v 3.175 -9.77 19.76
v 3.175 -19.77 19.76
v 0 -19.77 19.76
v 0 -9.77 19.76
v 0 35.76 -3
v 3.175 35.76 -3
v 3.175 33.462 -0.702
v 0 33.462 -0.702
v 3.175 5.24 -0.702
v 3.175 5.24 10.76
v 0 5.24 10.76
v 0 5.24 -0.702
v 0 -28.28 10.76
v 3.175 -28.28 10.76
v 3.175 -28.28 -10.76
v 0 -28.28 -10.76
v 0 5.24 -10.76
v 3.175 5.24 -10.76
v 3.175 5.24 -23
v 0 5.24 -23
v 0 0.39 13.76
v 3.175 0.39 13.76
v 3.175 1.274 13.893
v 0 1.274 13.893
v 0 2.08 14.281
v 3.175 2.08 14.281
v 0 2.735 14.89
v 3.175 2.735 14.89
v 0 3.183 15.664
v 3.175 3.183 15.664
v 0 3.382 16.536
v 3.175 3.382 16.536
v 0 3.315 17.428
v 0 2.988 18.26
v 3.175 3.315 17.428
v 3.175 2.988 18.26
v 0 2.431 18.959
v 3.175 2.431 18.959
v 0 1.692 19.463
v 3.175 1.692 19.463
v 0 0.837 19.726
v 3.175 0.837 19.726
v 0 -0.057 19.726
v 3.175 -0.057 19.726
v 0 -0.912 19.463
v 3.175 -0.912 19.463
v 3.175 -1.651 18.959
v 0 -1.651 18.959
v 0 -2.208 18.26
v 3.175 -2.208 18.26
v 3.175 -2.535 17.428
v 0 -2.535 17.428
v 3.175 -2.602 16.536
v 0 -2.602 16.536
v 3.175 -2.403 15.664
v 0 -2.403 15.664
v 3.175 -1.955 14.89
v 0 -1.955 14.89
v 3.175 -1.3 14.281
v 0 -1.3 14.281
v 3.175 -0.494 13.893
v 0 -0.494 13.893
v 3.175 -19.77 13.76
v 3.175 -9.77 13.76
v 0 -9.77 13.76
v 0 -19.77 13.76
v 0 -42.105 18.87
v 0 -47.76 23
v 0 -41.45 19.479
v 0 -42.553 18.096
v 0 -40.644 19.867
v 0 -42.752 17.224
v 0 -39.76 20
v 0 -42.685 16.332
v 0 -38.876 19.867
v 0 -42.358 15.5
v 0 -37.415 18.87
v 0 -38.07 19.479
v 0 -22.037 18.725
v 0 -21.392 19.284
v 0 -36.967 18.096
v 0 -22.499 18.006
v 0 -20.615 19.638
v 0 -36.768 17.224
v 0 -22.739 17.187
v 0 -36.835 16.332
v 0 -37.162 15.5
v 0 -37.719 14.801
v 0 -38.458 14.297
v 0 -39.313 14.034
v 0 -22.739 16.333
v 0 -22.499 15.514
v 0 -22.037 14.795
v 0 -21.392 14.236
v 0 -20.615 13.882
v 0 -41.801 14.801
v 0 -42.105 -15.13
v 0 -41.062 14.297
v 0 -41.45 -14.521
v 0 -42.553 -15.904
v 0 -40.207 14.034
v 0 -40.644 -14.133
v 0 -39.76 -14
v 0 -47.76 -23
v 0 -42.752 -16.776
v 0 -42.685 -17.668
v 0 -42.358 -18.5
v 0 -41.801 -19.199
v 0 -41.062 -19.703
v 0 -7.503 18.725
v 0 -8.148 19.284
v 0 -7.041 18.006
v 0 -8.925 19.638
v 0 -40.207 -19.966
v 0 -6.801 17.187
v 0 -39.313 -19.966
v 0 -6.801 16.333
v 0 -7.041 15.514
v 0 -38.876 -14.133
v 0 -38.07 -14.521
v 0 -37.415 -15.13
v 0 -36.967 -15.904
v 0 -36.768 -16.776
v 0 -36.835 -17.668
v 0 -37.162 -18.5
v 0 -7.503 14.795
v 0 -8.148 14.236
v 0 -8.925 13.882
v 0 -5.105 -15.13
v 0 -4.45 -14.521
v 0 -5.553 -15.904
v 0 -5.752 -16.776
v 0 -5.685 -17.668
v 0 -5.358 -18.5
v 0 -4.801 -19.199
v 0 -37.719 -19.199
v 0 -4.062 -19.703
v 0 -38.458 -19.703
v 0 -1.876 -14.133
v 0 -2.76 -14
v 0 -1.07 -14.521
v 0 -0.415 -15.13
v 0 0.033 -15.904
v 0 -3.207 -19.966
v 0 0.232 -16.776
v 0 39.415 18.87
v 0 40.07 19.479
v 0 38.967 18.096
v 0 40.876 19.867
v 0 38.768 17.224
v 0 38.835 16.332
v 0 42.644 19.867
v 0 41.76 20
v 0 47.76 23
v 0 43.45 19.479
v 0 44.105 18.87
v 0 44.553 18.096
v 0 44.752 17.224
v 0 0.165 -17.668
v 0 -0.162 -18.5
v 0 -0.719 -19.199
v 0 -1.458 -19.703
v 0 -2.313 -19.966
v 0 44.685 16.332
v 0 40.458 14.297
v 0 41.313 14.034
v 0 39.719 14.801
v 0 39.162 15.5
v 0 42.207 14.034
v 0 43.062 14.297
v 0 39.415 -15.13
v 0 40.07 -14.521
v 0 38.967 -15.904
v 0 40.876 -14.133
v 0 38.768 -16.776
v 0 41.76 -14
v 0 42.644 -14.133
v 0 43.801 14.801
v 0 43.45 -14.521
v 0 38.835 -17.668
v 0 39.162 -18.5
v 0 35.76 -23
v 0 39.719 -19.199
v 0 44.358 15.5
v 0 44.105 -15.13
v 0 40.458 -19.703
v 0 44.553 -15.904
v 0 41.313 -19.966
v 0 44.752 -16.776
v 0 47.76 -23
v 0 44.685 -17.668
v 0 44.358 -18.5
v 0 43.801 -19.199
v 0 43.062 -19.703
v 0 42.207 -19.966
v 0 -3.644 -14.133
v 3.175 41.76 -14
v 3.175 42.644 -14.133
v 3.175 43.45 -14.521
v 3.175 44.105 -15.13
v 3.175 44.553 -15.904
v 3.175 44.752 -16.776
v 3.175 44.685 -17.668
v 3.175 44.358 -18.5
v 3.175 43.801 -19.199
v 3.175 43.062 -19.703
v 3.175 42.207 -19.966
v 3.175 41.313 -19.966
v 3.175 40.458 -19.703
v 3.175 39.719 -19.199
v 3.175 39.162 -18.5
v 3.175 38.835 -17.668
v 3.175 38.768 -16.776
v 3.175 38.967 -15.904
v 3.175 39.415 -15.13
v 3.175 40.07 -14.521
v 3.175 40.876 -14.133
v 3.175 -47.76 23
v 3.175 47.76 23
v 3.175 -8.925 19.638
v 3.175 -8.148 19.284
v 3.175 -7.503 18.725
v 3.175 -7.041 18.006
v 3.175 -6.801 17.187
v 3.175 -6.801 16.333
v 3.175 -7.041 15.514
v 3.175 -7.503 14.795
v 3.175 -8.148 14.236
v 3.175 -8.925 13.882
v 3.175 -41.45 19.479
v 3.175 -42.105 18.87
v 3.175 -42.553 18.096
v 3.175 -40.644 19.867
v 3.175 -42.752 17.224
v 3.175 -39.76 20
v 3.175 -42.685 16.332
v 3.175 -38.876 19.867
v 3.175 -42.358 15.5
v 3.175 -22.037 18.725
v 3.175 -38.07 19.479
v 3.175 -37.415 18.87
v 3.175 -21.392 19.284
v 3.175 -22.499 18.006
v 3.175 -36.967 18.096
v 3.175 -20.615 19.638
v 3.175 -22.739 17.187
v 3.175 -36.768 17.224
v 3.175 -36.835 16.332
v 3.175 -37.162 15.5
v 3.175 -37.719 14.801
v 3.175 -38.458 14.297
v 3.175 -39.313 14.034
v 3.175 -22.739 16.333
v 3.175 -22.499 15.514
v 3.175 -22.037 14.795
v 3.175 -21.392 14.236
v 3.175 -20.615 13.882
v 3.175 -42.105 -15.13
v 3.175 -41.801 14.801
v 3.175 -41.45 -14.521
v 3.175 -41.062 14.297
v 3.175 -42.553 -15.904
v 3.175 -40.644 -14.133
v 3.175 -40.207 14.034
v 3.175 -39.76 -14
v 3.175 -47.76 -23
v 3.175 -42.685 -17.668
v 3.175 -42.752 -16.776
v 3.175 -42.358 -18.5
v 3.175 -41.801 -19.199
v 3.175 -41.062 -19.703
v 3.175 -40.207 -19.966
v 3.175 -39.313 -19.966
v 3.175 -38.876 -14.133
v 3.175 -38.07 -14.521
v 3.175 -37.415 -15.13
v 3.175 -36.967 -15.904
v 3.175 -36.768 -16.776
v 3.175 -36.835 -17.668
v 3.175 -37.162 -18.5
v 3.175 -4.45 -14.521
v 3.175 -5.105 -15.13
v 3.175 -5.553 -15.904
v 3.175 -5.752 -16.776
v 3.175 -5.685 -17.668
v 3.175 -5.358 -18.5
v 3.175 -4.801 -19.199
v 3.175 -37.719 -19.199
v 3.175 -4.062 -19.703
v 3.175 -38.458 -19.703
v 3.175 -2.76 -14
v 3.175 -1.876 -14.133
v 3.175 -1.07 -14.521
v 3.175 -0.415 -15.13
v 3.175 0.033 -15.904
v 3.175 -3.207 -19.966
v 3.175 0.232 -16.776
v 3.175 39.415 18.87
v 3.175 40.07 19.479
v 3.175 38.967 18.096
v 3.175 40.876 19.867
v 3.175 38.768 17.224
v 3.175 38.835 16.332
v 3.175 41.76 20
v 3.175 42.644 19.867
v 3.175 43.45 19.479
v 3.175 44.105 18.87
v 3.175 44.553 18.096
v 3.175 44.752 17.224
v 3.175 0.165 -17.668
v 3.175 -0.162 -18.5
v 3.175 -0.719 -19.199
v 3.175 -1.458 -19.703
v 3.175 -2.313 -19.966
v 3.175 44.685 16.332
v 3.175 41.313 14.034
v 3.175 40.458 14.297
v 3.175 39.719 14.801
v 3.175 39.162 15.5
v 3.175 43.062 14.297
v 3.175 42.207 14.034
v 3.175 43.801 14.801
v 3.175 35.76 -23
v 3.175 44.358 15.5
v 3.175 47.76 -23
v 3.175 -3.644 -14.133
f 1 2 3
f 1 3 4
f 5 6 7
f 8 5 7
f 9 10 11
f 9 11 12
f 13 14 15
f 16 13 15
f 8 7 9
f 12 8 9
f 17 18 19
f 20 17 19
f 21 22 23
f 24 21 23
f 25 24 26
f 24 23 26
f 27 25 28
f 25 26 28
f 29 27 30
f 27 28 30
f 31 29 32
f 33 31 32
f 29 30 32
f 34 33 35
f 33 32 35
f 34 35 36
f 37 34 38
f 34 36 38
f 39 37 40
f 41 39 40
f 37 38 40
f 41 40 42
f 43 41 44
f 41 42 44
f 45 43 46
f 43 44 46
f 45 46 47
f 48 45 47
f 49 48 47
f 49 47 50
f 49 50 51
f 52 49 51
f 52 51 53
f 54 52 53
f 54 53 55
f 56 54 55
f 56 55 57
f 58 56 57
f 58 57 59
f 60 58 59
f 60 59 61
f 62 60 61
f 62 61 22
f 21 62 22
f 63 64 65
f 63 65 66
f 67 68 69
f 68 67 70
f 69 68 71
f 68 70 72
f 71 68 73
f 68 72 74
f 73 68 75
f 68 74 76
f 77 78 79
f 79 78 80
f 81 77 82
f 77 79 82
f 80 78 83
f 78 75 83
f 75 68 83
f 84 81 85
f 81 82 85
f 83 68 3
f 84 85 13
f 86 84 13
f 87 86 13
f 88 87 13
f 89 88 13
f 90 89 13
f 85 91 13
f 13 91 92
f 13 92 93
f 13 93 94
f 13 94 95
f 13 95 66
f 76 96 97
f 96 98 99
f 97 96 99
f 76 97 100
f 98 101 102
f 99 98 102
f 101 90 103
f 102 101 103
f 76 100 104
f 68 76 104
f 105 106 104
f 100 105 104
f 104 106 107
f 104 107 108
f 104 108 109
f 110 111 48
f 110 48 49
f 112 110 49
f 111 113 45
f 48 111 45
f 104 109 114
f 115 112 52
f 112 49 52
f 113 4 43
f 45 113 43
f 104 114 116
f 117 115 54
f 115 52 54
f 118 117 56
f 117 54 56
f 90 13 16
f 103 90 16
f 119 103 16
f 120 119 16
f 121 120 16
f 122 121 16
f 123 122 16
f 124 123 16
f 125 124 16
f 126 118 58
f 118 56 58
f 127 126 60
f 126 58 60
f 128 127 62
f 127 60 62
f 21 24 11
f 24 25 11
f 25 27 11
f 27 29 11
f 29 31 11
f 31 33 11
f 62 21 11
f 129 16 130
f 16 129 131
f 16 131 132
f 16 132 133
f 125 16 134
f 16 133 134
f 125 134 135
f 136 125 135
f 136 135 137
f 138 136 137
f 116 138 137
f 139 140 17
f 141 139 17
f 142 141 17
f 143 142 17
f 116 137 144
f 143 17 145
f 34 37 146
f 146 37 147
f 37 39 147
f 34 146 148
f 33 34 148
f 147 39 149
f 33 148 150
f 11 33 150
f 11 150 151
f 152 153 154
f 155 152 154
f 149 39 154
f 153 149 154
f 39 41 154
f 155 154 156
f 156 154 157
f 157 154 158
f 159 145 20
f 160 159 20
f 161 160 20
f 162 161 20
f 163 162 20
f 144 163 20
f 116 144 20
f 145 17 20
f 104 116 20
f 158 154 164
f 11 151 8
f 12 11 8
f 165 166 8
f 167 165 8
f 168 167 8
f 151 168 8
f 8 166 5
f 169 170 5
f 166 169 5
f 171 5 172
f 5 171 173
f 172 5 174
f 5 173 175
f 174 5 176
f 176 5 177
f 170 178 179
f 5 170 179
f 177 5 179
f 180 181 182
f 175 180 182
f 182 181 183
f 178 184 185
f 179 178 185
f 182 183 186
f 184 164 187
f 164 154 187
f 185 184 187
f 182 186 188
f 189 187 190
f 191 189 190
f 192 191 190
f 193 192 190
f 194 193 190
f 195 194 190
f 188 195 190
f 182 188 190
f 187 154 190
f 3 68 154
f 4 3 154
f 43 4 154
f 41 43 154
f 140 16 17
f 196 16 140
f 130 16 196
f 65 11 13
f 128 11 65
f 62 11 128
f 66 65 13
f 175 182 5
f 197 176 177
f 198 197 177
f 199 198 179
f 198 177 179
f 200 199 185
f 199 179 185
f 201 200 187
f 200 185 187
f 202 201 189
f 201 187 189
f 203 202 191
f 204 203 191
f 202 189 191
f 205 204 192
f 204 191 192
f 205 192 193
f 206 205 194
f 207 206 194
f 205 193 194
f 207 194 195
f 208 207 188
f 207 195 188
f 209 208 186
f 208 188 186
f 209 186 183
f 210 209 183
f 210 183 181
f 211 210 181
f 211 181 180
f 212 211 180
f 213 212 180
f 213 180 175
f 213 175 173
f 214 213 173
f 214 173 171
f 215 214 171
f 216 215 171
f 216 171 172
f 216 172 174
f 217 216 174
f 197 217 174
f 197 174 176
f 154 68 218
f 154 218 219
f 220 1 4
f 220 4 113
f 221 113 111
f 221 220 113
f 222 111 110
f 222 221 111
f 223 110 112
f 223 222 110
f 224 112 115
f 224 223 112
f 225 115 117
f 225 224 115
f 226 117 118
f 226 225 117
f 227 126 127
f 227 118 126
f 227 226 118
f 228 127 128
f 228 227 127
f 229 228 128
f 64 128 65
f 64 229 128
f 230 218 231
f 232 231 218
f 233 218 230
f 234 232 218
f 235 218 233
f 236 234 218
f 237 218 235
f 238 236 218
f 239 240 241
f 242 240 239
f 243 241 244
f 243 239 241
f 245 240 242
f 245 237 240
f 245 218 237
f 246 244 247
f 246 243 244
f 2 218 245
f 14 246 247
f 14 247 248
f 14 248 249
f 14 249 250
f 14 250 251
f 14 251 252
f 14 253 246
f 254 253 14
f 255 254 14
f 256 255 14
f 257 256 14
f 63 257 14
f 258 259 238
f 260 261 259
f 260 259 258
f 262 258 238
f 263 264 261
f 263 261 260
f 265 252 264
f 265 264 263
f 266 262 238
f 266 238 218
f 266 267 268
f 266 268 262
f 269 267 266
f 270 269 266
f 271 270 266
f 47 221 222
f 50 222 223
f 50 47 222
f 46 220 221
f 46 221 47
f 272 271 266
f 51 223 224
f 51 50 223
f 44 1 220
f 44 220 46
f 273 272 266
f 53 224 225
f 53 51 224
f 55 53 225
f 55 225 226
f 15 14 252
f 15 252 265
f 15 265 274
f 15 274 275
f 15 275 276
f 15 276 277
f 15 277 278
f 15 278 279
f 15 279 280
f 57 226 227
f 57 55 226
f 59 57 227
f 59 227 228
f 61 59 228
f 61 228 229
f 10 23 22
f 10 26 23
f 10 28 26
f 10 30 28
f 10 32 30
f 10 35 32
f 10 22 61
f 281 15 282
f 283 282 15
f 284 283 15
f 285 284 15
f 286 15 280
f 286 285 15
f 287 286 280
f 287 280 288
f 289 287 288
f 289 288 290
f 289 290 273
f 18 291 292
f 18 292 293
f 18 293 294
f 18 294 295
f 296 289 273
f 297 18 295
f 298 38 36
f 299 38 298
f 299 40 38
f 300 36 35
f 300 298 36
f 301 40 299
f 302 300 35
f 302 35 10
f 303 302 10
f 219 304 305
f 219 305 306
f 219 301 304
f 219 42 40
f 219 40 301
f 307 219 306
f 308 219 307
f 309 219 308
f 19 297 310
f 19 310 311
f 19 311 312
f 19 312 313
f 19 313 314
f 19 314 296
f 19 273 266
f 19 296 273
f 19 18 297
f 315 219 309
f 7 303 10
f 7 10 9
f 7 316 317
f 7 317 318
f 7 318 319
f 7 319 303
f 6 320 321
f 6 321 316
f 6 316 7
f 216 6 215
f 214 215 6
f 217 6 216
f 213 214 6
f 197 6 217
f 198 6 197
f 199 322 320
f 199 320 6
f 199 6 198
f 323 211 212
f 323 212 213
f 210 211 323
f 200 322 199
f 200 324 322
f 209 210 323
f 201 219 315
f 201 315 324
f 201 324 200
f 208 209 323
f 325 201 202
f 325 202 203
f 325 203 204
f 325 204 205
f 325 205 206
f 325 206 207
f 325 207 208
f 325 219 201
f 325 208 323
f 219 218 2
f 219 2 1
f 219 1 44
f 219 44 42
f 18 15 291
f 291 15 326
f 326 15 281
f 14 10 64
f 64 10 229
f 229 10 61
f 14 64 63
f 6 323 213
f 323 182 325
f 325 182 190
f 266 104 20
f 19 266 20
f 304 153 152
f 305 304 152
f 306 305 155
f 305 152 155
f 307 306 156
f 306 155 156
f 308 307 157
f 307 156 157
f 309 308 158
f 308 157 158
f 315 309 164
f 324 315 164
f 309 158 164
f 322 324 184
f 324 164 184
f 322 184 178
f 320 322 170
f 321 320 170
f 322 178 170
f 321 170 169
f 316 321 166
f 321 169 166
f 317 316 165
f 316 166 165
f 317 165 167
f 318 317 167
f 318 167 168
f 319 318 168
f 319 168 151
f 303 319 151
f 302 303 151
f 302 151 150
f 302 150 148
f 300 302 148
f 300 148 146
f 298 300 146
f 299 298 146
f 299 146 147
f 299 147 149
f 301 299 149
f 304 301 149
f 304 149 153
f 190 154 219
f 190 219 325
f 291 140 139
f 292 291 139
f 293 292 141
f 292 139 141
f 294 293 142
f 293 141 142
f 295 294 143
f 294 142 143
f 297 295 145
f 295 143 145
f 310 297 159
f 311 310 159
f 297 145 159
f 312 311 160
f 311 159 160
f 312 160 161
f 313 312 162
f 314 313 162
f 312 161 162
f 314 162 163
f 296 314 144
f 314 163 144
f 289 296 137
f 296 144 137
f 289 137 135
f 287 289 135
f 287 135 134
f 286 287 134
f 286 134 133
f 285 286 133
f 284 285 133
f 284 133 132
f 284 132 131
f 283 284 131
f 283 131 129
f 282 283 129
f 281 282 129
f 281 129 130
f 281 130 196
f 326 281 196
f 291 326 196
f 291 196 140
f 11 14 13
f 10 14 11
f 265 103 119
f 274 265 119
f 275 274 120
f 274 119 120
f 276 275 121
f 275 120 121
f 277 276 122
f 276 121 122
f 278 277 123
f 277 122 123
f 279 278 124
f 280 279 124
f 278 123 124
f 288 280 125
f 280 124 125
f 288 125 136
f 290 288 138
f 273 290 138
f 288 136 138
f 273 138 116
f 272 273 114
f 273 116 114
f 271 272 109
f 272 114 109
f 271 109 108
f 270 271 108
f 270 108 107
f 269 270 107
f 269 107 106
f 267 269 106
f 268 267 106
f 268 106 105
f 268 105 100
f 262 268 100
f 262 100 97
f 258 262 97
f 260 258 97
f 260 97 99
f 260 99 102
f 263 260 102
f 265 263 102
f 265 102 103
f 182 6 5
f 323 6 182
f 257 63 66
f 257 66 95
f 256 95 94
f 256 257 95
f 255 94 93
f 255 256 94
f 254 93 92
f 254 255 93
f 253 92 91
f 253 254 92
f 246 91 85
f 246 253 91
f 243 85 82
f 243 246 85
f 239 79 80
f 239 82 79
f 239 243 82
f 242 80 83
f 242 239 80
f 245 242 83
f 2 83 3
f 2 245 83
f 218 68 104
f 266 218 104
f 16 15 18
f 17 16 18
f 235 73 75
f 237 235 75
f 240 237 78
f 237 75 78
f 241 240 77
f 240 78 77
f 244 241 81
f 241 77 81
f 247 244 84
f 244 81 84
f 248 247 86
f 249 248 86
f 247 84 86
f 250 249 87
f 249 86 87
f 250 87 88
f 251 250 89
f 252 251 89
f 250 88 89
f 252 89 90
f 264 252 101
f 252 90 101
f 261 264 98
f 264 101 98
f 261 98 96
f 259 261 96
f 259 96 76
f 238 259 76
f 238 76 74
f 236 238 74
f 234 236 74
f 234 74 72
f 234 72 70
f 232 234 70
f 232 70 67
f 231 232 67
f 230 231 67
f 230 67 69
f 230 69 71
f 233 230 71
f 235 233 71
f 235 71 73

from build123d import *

# Parameters (mm, degrees)
SKETCH1_W                       = 46
SKETCH1_H                       = 95.52
BOSS_EXTRUDE1_DEPTH             = 3.175
SKETCH2_W                       = 20
SKETCH2_H                       = 30.52
CUT_EXTRUDE1_DEPTH              = 54.104597023
F_6_0MM_CLEARANCE_DOWEL_HOLE1_D = 6
F_6_0MM_DOWEL_HOLE1_D           = 6
CUT_EXTRUDE2_DEPTH              = 54.104597023
SKETCH10_W                      = 21.52
SKETCH10_H                      = 8.52
CUT_EXTRUDE3_DEPTH              = 54.104597023
SKETCH11_W                      = 21.52
SKETCH11_H                      = 25
CUT_EXTRUDE4_DEPTH              = 54.104597023
SKETCH14_R                      = 3
CUT_EXTRUDE5_DEPTH              = 54.104597023


with BuildPart() as part:
    # Sketch1 → Boss-Extrude1 (new body)
    with BuildSketch(Plane(origin=(0, 0, 0), x_dir=(0, 0, -1), z_dir=(1, 0, 0))):
        Rectangle(SKETCH1_W, SKETCH1_H)
    extrude(amount=BOSS_EXTRUDE1_DEPTH)

    # Sketch2 → Cut-Extrude1 (cut, through all)
    with BuildSketch(Plane(origin=(3.175, 0, 0), x_dir=(0, 0, -1), z_dir=(1, 0, 0))):
        with Locations((13, 20.5)):
            Rectangle(SKETCH2_W, SKETCH2_H)
    extrude(amount=-CUT_EXTRUDE1_DEPTH, mode=Mode.SUBTRACT)

    # Ø6.0mm Clearance Dowel Hole1 (through all)
    with Locations(Plane(origin=(3.175, 0, 0), x_dir=(0, 0, -1), z_dir=(1, 0, 0))):
        with Locations((17, -2.76), (17, -39.76)):
            Hole(F_6_0MM_CLEARANCE_DOWEL_HOLE1_D / 2)

    # Ø6.0mm Dowel Hole1 (through all)
    with Locations(Plane(origin=(3.175, 0, 0), x_dir=(0, 0, -1), z_dir=(1, 0, 0))):
        with Locations((17, 41.76), (-17, 41.76), (-17, -39.76)):
            Hole(F_6_0MM_DOWEL_HOLE1_D / 2)

    # Sketch9 → Cut-Extrude2 (cut, through all)
    with BuildSketch(Plane(origin=(3.175, 0, 0), x_dir=(0, 0, -1), z_dir=(1, 0, 0))):
        Polygon((3, 35.76), (0.701902961, 33.461902961), (0.701902961, 5.24), (3, 5.24), align=None)
    extrude(amount=-CUT_EXTRUDE2_DEPTH, mode=Mode.SUBTRACT)

    # Sketch10 → Cut-Extrude3 (cut, through all)
    with BuildSketch(Plane(origin=(3.175, 0, 0), x_dir=(0, 0, -1), z_dir=(1, 0, 0))):
        with Locations((0, 0.98)):
            Rectangle(SKETCH10_W, SKETCH10_H)
    extrude(amount=-CUT_EXTRUDE3_DEPTH, mode=Mode.SUBTRACT)

    # Sketch11 → Cut-Extrude4 (cut, through all)
    with BuildSketch(Plane(origin=(3.175, 0, 0), x_dir=(0, 0, -1), z_dir=(1, 0, 0))):
        with Locations((0, -15.78)):
            Rectangle(SKETCH11_W, SKETCH11_H)
    extrude(amount=-CUT_EXTRUDE4_DEPTH, mode=Mode.SUBTRACT)

    # Sketch14 → Cut-Extrude5 (cut, through all)
    with BuildSketch(Plane(origin=(3.175, 0, 0), x_dir=(0, 0, -1), z_dir=(1, 0, 0))):
        with Locations((-16.76, 0.39)):
            Circle(SKETCH14_R)
        with BuildLine():
            Line((-13.76, -9.77), (-13.76, -19.77))
            ThreePointArc((-13.76, -19.77), (-16.76, -22.77), (-19.76, -19.77))
            Line((-19.76, -19.77), (-19.76, -9.77))
            ThreePointArc((-19.76, -9.77), (-16.76, -6.77), (-13.76, -9.77))
        make_face()
    extrude(amount=-CUT_EXTRUDE5_DEPTH, mode=Mode.SUBTRACT)


solid = part.part
